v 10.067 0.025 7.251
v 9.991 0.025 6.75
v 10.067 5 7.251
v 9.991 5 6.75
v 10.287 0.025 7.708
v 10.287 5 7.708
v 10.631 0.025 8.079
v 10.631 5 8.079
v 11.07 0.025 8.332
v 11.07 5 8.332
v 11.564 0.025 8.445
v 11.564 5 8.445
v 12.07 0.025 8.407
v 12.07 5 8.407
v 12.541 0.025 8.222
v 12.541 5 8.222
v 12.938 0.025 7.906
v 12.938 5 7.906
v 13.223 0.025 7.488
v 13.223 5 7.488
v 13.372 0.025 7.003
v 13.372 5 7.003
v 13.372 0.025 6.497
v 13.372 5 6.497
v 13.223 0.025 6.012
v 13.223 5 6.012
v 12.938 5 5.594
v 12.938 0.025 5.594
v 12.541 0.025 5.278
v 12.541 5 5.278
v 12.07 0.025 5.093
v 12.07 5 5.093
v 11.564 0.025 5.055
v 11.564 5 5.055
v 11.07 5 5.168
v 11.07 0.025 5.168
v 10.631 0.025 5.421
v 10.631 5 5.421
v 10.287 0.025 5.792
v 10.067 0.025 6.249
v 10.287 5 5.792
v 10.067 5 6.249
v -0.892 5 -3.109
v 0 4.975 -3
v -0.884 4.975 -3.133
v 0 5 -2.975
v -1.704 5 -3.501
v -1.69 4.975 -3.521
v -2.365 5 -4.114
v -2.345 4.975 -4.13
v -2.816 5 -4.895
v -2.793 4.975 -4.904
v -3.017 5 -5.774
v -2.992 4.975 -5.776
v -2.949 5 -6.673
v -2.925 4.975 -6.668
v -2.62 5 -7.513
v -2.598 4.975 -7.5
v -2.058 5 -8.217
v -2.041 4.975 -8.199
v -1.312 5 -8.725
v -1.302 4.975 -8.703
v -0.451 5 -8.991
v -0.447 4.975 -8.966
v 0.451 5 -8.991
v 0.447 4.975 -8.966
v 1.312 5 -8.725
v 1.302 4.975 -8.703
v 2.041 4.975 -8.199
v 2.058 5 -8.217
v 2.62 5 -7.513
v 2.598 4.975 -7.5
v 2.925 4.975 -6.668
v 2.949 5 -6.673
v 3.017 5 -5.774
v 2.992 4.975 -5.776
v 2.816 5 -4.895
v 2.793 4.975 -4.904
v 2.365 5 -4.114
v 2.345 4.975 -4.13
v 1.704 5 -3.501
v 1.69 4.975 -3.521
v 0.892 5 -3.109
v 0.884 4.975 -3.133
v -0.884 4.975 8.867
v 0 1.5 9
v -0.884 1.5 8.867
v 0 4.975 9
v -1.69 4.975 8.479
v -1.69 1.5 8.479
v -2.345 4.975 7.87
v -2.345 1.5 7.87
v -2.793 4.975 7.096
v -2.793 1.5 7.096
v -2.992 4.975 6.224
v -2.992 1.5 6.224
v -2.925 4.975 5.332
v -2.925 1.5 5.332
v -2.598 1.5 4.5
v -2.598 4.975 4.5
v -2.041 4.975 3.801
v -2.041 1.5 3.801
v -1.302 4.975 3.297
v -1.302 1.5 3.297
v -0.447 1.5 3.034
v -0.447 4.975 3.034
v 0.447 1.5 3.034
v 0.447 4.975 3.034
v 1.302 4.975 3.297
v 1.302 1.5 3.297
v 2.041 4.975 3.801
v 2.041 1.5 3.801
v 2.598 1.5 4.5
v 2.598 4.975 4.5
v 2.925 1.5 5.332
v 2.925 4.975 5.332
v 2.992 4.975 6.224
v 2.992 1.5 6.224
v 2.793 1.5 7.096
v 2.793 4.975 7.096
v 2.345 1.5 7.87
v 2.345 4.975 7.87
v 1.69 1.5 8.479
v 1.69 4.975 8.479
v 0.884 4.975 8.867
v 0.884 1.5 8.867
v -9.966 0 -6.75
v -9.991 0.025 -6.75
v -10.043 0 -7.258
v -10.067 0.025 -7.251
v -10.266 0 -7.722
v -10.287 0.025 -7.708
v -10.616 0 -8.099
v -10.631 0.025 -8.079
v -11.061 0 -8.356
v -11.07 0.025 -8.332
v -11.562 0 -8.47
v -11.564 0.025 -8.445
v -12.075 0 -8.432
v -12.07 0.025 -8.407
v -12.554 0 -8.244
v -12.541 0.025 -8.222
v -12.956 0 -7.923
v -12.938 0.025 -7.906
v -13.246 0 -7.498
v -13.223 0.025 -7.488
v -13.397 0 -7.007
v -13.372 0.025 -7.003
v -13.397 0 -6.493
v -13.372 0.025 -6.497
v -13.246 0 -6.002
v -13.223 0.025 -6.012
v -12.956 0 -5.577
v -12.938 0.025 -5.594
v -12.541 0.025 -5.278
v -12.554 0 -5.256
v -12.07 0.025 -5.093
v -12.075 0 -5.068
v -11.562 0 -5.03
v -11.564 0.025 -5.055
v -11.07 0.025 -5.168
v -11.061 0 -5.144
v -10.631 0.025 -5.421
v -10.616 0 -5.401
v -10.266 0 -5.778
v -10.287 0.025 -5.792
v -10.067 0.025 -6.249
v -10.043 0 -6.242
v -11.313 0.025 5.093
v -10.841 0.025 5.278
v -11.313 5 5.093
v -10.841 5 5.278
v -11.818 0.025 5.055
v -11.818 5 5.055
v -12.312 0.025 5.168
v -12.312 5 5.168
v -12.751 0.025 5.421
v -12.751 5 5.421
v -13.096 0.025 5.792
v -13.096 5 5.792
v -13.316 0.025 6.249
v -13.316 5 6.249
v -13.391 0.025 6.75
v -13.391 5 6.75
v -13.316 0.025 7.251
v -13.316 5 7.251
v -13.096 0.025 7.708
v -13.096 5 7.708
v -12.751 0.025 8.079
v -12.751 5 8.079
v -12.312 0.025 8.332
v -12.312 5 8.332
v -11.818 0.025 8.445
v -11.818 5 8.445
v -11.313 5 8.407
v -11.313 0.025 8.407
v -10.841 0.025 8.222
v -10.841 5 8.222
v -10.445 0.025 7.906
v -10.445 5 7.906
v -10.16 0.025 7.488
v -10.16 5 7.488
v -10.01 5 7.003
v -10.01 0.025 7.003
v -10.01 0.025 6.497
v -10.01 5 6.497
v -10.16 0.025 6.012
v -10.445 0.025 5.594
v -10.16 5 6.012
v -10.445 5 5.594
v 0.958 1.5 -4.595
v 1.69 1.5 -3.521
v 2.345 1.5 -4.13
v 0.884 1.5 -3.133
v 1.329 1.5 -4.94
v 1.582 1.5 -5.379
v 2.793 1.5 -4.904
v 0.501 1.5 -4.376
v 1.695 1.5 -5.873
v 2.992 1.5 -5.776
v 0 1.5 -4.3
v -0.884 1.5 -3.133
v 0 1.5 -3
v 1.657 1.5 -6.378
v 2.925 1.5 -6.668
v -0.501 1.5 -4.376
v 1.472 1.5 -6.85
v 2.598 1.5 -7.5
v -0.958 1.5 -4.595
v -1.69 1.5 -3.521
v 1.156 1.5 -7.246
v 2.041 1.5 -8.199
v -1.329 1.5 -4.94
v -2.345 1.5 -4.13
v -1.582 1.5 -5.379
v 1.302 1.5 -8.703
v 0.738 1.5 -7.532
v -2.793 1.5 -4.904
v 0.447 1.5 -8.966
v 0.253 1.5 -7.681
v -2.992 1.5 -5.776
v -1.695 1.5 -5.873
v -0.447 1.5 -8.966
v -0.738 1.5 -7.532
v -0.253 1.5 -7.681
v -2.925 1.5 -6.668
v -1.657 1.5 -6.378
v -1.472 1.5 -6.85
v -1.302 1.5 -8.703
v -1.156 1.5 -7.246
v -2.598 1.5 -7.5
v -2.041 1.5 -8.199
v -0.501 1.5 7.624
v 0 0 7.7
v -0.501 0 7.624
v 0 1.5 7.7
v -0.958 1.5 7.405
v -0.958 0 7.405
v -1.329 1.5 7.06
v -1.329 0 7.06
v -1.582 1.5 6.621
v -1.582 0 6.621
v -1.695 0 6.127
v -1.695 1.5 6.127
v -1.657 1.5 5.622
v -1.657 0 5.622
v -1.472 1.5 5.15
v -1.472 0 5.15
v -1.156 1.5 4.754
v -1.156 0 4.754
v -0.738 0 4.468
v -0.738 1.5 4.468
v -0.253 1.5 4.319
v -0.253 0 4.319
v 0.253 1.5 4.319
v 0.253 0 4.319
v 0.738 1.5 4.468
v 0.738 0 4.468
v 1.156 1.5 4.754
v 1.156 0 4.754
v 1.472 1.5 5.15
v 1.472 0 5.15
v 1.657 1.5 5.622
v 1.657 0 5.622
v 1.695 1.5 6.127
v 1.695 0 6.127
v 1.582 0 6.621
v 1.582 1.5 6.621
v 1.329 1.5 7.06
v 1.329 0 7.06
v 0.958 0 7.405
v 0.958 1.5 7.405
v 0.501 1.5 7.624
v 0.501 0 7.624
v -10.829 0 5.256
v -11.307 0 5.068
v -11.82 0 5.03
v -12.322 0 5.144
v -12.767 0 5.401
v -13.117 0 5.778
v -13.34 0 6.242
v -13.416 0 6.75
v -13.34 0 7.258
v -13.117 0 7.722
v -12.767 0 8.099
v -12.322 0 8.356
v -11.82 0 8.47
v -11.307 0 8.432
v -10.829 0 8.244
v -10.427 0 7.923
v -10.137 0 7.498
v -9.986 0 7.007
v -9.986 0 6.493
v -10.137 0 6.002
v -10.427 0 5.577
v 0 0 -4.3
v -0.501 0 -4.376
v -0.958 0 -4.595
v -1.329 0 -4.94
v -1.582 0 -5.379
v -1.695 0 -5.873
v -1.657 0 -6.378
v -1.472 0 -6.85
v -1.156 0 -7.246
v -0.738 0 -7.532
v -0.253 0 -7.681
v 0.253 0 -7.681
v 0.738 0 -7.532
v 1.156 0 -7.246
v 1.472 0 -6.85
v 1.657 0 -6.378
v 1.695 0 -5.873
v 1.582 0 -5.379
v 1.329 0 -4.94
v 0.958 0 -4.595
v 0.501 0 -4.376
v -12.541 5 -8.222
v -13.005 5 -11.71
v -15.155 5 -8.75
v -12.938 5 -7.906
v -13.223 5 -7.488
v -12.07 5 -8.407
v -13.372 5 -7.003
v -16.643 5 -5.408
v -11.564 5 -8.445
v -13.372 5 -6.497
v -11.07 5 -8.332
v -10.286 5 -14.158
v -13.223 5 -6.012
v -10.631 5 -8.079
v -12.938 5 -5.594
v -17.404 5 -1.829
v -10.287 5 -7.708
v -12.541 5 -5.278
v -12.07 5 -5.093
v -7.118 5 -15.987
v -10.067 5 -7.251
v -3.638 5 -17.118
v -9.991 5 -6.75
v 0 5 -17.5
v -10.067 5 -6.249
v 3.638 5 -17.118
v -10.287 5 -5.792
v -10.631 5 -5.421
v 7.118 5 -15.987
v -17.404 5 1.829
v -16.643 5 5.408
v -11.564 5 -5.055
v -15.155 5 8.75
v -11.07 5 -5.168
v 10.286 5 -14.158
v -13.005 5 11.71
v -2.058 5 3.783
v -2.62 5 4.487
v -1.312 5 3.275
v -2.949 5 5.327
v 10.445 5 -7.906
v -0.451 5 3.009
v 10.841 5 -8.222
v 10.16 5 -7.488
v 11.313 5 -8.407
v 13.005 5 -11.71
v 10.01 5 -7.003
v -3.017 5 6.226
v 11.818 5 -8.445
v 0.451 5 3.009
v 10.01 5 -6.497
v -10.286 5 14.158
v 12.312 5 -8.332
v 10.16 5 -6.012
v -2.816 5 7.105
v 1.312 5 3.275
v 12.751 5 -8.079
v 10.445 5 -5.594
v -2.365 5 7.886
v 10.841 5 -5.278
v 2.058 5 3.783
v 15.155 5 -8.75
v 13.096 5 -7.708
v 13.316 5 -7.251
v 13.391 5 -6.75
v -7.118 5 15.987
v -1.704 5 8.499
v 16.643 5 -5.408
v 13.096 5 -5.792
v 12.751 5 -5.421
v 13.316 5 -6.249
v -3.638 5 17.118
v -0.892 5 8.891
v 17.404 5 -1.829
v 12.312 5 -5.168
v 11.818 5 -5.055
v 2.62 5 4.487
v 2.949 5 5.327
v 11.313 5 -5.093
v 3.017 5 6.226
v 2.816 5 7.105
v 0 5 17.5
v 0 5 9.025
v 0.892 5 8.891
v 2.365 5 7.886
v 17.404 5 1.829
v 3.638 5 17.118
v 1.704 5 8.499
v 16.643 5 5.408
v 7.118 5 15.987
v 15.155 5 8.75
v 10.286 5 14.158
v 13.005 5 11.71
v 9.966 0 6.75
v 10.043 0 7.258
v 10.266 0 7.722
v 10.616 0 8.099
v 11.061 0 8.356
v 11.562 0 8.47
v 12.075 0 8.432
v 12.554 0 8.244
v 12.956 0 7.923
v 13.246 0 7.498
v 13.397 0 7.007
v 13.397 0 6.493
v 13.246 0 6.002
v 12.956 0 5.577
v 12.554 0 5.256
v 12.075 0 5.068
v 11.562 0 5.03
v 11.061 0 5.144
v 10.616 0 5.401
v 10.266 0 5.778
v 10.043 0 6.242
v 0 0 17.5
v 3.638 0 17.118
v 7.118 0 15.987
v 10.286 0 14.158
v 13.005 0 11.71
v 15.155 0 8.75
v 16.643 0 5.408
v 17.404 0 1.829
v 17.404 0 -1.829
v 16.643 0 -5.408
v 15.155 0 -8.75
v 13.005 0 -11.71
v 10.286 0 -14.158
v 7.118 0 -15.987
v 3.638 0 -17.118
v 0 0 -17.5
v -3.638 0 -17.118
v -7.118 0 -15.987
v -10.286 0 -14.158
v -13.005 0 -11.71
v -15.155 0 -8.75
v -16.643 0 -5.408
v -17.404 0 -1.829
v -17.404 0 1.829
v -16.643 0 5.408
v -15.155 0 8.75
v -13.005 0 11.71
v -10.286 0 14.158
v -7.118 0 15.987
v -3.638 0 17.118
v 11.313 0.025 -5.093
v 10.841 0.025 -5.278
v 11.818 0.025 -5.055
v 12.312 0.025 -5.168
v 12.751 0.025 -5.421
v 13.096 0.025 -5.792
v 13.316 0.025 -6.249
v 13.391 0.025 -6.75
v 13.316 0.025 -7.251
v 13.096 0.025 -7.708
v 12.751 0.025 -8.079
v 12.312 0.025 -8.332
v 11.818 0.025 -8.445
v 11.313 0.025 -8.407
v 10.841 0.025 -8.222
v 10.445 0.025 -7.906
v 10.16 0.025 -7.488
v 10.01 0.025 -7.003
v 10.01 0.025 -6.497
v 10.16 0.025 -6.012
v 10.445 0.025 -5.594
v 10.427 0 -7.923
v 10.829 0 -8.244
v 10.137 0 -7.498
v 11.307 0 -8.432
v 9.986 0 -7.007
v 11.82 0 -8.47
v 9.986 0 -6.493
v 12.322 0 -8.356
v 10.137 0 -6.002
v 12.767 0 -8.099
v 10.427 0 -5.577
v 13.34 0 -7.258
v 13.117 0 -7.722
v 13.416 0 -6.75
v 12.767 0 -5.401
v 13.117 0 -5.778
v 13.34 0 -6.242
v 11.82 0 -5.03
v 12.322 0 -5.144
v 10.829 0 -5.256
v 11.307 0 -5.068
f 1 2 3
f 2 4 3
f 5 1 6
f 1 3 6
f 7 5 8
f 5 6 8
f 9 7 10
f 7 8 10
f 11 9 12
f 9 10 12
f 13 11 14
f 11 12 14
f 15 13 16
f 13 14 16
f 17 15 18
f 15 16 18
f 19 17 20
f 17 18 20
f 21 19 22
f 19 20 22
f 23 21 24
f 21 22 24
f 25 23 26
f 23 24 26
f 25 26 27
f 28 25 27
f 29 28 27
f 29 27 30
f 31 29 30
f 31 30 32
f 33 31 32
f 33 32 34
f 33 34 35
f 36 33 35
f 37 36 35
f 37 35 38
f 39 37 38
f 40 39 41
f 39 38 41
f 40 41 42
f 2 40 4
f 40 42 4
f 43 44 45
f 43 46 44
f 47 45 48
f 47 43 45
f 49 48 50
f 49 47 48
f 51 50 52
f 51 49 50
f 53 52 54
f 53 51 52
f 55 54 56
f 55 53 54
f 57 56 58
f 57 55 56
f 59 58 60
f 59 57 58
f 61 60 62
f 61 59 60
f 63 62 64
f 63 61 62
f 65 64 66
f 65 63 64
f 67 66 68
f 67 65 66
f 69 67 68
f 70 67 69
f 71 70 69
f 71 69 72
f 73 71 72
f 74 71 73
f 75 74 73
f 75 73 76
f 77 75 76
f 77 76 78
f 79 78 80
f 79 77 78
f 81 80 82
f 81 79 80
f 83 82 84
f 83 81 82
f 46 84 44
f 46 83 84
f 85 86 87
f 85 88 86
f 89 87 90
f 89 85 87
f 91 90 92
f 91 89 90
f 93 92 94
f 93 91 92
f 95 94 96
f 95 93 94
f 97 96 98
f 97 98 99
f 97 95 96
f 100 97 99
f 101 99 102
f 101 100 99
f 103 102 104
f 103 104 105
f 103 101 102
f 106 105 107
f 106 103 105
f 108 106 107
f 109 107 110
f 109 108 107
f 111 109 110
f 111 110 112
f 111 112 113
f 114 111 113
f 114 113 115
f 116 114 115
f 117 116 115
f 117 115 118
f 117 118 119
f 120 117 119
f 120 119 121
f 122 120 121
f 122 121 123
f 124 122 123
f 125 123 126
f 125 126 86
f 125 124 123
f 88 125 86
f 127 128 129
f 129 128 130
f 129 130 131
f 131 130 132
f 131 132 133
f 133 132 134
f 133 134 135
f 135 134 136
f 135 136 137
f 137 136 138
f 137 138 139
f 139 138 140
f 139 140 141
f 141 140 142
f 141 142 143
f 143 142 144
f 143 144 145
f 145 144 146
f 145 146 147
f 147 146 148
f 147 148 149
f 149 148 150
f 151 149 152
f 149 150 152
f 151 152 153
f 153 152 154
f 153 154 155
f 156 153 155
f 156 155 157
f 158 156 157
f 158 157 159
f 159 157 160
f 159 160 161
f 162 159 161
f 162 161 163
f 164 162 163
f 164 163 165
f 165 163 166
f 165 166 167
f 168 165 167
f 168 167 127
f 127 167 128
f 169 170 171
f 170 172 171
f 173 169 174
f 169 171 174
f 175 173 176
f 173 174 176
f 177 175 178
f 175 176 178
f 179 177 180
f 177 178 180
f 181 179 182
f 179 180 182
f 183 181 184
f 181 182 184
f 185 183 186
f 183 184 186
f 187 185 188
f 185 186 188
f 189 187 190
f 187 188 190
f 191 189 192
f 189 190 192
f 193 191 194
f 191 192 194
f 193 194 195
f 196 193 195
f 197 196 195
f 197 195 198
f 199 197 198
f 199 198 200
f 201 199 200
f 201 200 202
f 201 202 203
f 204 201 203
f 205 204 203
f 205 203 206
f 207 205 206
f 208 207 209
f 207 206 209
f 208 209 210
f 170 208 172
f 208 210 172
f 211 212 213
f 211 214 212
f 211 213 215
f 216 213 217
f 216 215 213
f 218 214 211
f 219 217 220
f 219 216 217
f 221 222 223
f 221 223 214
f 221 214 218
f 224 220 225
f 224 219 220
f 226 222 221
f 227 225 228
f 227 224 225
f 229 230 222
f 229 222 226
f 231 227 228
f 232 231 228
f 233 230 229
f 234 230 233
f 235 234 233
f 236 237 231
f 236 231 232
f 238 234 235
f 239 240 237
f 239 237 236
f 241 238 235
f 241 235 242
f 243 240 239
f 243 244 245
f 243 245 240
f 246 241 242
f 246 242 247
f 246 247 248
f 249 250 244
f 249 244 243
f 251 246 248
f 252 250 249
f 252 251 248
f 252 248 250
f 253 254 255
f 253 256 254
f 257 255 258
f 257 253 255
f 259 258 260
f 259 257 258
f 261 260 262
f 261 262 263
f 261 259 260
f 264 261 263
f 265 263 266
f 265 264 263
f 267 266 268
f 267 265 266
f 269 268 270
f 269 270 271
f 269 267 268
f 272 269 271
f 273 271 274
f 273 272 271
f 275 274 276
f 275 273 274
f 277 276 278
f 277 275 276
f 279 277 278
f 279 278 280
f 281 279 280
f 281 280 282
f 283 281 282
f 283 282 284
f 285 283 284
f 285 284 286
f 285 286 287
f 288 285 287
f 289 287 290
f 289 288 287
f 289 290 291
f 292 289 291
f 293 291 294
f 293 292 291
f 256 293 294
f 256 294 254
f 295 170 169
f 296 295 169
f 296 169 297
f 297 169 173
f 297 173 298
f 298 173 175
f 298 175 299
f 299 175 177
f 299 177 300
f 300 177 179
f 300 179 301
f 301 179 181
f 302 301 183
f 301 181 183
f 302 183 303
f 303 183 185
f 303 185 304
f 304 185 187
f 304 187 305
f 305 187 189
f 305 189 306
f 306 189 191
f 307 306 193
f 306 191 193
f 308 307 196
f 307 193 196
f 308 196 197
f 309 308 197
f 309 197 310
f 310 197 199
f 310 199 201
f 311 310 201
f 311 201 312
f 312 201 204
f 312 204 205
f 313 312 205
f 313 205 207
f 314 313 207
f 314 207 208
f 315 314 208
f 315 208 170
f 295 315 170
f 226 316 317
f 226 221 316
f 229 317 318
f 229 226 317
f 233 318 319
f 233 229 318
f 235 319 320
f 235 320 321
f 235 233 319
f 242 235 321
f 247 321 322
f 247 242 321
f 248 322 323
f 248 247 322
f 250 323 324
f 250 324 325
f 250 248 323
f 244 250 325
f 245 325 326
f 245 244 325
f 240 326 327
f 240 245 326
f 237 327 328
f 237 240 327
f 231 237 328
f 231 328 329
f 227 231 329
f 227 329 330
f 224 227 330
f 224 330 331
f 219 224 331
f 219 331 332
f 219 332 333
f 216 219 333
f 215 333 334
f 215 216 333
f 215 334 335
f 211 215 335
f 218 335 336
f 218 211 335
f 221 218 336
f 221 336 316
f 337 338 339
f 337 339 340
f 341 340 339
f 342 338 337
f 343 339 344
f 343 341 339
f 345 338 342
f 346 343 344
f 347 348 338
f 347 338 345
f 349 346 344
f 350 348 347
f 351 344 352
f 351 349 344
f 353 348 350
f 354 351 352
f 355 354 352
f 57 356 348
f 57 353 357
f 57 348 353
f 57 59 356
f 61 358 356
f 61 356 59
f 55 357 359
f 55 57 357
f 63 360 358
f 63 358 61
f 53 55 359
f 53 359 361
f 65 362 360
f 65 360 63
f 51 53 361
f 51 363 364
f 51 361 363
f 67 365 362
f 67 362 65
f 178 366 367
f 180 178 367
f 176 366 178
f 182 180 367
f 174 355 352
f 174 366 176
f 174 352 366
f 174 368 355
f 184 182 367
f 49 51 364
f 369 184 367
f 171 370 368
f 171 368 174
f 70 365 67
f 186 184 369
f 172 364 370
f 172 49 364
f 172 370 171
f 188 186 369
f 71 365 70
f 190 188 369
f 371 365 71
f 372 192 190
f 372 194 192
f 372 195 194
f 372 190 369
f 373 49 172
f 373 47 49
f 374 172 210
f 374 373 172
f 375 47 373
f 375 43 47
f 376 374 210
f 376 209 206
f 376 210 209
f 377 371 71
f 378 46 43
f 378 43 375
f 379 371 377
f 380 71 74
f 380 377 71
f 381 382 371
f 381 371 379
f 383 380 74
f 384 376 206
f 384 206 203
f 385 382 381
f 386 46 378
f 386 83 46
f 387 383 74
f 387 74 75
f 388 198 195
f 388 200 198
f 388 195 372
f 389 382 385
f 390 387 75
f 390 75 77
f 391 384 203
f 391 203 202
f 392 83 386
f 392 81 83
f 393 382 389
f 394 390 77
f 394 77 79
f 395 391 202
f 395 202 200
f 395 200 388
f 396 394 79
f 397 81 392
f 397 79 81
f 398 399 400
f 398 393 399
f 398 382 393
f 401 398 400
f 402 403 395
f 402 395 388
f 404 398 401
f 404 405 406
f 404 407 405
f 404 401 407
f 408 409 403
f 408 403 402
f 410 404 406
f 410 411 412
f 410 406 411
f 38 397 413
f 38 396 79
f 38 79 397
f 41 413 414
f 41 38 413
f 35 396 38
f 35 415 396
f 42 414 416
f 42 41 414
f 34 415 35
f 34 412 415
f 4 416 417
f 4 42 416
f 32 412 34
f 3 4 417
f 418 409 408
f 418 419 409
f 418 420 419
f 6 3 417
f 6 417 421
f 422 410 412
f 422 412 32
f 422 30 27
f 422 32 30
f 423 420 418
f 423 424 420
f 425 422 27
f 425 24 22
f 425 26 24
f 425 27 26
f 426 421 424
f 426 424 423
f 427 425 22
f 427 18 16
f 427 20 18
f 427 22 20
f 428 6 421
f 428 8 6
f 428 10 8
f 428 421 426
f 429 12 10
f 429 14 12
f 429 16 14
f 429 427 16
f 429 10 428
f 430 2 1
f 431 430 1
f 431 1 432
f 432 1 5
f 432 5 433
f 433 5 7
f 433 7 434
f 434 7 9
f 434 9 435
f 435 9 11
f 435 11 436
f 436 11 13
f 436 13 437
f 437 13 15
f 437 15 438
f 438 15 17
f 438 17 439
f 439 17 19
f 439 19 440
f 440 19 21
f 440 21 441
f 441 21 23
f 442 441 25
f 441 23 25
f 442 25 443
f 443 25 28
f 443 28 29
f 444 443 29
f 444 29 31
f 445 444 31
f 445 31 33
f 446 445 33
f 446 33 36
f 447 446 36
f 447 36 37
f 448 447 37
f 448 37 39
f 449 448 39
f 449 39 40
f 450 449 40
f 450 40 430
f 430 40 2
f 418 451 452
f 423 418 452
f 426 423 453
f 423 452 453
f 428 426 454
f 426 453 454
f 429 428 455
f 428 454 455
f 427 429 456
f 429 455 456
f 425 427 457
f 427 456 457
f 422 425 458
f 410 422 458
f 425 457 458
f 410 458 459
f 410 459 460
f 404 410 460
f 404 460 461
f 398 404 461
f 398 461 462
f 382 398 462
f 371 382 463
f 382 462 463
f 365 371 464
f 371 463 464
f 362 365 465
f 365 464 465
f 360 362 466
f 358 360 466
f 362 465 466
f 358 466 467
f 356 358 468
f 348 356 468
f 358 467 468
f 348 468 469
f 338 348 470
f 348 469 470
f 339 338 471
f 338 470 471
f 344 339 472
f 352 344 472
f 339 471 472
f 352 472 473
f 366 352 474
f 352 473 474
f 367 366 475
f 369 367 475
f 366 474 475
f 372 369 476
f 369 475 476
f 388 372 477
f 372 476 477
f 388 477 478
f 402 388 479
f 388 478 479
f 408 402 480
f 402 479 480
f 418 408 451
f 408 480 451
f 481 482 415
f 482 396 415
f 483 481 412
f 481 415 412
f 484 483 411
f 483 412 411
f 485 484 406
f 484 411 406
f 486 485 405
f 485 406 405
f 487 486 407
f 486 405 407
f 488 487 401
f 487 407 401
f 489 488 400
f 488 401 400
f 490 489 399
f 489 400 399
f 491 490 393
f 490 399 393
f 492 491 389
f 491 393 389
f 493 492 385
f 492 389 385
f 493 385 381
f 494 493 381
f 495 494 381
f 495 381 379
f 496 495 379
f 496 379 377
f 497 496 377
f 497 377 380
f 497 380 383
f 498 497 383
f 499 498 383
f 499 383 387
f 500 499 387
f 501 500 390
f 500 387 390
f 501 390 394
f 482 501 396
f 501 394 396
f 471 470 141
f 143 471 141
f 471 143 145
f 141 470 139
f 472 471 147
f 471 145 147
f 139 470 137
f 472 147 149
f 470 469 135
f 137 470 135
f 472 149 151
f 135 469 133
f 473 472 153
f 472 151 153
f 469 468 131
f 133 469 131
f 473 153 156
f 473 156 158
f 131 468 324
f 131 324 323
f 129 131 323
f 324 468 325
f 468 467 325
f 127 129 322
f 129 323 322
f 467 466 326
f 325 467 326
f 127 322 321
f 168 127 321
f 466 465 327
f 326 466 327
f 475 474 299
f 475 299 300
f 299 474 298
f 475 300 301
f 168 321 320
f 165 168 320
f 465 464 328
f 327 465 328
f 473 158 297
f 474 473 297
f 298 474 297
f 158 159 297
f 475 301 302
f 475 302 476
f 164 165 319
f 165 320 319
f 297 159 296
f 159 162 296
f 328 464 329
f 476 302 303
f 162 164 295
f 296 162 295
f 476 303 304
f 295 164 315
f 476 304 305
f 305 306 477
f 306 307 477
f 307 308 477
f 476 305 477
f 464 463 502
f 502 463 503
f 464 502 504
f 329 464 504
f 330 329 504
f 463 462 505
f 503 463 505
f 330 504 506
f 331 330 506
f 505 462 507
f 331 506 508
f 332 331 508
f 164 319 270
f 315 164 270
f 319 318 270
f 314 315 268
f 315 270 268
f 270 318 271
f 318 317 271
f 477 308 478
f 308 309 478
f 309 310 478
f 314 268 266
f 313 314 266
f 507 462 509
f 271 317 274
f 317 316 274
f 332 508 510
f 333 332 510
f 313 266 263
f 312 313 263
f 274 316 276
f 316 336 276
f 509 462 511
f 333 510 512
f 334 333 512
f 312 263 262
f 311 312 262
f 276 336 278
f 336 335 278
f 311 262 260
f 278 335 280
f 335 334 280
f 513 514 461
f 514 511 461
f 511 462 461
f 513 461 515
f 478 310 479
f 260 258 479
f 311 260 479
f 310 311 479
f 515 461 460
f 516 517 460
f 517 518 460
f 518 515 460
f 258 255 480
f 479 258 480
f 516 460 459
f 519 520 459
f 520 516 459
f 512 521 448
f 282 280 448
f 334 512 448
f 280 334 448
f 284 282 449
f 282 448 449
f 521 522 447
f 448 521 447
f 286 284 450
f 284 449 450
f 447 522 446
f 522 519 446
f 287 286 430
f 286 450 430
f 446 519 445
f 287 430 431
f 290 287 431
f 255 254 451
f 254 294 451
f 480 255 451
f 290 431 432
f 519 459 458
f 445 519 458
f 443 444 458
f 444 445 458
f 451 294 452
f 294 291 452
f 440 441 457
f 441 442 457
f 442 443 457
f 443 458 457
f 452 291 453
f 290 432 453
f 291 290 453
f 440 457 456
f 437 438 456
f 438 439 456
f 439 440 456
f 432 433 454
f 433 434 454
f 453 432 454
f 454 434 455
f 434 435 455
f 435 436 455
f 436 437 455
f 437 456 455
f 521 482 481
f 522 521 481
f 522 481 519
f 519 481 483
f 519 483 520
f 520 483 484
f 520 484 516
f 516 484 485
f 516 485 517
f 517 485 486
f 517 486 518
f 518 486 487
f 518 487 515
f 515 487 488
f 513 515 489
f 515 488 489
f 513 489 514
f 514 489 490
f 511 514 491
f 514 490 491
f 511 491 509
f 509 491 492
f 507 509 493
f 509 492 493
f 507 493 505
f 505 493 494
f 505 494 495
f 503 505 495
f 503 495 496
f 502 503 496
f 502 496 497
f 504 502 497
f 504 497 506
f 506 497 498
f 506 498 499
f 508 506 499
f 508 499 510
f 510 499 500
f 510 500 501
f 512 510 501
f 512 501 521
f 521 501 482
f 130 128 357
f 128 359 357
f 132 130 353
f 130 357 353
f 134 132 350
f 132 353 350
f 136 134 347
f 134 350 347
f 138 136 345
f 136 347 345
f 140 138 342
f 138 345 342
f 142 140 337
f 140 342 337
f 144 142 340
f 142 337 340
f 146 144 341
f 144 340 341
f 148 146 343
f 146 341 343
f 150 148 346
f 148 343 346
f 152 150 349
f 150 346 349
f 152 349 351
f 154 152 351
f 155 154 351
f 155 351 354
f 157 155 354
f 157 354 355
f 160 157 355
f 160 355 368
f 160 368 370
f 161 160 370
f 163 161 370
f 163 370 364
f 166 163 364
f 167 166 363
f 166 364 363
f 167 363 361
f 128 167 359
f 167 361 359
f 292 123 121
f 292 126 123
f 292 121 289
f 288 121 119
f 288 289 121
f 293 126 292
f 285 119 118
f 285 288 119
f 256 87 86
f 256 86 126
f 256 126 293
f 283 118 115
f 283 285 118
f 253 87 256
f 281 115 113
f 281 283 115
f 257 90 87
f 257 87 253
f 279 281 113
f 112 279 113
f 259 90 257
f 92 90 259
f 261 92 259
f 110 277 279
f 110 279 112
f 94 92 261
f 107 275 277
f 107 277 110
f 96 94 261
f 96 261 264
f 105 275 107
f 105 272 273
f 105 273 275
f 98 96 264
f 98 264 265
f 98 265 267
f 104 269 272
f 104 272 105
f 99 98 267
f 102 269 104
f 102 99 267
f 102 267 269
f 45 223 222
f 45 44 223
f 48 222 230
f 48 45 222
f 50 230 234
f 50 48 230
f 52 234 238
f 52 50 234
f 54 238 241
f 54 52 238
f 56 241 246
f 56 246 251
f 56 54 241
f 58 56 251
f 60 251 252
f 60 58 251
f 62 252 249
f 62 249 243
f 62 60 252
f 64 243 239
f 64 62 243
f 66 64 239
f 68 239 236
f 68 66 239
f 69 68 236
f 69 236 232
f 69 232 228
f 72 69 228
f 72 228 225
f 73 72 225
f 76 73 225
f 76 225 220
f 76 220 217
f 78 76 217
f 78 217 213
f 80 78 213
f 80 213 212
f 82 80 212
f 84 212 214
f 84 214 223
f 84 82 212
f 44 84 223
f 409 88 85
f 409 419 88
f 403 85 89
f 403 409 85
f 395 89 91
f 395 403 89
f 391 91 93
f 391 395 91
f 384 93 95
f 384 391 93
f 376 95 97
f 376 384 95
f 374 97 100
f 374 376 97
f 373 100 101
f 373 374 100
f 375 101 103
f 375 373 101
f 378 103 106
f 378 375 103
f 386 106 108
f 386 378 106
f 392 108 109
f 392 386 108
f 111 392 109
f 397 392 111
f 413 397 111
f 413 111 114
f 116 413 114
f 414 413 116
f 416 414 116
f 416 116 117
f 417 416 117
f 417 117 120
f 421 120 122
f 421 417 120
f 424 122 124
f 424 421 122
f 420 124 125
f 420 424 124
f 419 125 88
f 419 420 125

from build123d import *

# Parameters (mm, degrees)
SKETCH_1_R                    = 17.5
EXTRUDE_1_DEPTH               = 5
HOLE_WIZARD_M3_1_D            = 3.4
HOLE_WIZARD_M3_1_CSINK_D      = 3.45
HOLE_WIZARD_M3_1_CSINK_ANGLE  = 90
PATTERN_CIRCULAR_1_COUNT      = 6
HOLE_WIZARD_M3_1_2_AT_2_COUNT = 2
HOLE_WIZARD_M3_1_2_AT_2_PITCH = 12


with BuildPart() as part:
    # 草图1 → 凸台-拉伸1 (new body)
    with BuildSketch(Plane(origin=(0, 0, 0), x_dir=(1, 0, 0), z_dir=(0, 1, 0))):
        with Locations(Location((0, 0, 0), (0, 0, 270))):
            Circle(SKETCH_1_R)
    extrude(amount=EXTRUDE_1_DEPTH)

    # Hole Wizard M3 _1 (through all)
    with Locations(Plane(origin=(0, 0, 0), x_dir=(-1, 0, 0), z_dir=(0, -1, 0))):
        with Locations((11.691342951, 6.75)):
            hole_wizard_m3_1 = CounterSinkHole(HOLE_WIZARD_M3_1_D / 2, HOLE_WIZARD_M3_1_CSINK_D / 2, counter_sink_angle=HOLE_WIZARD_M3_1_CSINK_ANGLE)

    # 阵列(圆周)1: Hole Wizard M3 _1 ×6 about axis, 2 skipped
    pattern_circular_1_axis = Axis((0, 0, 0), (0, -1, 0))
    add([hole_wizard_m3_1.rotate(pattern_circular_1_axis, i * 360 / PATTERN_CIRCULAR_1_COUNT) for i in range(1, PATTERN_CIRCULAR_1_COUNT) if i not in (1, 4)], mode=Mode.SUBTRACT)

    # 草图6 → Hole Wizard M3 _1 2 (revolve, cut)
    with BuildSketch(Plane(origin=(0, 5, -6), x_dir=(0, 0, 1), z_dir=(1, 0, 0))):
        Polygon((0, 0), (0, 5), (1.7, 5), (1.7, 3.5), (3, 3.5), (3, 0.025), (3.025, 0), align=None)
    hole_wizard_m3_1_2 = revolve(axis=Axis((0, 11.35, -6), (0, -1, 0)), mode=Mode.SUBTRACT)

    # Hole Wizard M3 _1 2 at 2: Hole Wizard M3 _1 2 ×2
    with Locations(*[(0, 0, i * HOLE_WIZARD_M3_1_2_AT_2_PITCH) for i in range(1, HOLE_WIZARD_M3_1_2_AT_2_COUNT)]):
        add(hole_wizard_m3_1_2, mode=Mode.SUBTRACT)


solid = part.part
